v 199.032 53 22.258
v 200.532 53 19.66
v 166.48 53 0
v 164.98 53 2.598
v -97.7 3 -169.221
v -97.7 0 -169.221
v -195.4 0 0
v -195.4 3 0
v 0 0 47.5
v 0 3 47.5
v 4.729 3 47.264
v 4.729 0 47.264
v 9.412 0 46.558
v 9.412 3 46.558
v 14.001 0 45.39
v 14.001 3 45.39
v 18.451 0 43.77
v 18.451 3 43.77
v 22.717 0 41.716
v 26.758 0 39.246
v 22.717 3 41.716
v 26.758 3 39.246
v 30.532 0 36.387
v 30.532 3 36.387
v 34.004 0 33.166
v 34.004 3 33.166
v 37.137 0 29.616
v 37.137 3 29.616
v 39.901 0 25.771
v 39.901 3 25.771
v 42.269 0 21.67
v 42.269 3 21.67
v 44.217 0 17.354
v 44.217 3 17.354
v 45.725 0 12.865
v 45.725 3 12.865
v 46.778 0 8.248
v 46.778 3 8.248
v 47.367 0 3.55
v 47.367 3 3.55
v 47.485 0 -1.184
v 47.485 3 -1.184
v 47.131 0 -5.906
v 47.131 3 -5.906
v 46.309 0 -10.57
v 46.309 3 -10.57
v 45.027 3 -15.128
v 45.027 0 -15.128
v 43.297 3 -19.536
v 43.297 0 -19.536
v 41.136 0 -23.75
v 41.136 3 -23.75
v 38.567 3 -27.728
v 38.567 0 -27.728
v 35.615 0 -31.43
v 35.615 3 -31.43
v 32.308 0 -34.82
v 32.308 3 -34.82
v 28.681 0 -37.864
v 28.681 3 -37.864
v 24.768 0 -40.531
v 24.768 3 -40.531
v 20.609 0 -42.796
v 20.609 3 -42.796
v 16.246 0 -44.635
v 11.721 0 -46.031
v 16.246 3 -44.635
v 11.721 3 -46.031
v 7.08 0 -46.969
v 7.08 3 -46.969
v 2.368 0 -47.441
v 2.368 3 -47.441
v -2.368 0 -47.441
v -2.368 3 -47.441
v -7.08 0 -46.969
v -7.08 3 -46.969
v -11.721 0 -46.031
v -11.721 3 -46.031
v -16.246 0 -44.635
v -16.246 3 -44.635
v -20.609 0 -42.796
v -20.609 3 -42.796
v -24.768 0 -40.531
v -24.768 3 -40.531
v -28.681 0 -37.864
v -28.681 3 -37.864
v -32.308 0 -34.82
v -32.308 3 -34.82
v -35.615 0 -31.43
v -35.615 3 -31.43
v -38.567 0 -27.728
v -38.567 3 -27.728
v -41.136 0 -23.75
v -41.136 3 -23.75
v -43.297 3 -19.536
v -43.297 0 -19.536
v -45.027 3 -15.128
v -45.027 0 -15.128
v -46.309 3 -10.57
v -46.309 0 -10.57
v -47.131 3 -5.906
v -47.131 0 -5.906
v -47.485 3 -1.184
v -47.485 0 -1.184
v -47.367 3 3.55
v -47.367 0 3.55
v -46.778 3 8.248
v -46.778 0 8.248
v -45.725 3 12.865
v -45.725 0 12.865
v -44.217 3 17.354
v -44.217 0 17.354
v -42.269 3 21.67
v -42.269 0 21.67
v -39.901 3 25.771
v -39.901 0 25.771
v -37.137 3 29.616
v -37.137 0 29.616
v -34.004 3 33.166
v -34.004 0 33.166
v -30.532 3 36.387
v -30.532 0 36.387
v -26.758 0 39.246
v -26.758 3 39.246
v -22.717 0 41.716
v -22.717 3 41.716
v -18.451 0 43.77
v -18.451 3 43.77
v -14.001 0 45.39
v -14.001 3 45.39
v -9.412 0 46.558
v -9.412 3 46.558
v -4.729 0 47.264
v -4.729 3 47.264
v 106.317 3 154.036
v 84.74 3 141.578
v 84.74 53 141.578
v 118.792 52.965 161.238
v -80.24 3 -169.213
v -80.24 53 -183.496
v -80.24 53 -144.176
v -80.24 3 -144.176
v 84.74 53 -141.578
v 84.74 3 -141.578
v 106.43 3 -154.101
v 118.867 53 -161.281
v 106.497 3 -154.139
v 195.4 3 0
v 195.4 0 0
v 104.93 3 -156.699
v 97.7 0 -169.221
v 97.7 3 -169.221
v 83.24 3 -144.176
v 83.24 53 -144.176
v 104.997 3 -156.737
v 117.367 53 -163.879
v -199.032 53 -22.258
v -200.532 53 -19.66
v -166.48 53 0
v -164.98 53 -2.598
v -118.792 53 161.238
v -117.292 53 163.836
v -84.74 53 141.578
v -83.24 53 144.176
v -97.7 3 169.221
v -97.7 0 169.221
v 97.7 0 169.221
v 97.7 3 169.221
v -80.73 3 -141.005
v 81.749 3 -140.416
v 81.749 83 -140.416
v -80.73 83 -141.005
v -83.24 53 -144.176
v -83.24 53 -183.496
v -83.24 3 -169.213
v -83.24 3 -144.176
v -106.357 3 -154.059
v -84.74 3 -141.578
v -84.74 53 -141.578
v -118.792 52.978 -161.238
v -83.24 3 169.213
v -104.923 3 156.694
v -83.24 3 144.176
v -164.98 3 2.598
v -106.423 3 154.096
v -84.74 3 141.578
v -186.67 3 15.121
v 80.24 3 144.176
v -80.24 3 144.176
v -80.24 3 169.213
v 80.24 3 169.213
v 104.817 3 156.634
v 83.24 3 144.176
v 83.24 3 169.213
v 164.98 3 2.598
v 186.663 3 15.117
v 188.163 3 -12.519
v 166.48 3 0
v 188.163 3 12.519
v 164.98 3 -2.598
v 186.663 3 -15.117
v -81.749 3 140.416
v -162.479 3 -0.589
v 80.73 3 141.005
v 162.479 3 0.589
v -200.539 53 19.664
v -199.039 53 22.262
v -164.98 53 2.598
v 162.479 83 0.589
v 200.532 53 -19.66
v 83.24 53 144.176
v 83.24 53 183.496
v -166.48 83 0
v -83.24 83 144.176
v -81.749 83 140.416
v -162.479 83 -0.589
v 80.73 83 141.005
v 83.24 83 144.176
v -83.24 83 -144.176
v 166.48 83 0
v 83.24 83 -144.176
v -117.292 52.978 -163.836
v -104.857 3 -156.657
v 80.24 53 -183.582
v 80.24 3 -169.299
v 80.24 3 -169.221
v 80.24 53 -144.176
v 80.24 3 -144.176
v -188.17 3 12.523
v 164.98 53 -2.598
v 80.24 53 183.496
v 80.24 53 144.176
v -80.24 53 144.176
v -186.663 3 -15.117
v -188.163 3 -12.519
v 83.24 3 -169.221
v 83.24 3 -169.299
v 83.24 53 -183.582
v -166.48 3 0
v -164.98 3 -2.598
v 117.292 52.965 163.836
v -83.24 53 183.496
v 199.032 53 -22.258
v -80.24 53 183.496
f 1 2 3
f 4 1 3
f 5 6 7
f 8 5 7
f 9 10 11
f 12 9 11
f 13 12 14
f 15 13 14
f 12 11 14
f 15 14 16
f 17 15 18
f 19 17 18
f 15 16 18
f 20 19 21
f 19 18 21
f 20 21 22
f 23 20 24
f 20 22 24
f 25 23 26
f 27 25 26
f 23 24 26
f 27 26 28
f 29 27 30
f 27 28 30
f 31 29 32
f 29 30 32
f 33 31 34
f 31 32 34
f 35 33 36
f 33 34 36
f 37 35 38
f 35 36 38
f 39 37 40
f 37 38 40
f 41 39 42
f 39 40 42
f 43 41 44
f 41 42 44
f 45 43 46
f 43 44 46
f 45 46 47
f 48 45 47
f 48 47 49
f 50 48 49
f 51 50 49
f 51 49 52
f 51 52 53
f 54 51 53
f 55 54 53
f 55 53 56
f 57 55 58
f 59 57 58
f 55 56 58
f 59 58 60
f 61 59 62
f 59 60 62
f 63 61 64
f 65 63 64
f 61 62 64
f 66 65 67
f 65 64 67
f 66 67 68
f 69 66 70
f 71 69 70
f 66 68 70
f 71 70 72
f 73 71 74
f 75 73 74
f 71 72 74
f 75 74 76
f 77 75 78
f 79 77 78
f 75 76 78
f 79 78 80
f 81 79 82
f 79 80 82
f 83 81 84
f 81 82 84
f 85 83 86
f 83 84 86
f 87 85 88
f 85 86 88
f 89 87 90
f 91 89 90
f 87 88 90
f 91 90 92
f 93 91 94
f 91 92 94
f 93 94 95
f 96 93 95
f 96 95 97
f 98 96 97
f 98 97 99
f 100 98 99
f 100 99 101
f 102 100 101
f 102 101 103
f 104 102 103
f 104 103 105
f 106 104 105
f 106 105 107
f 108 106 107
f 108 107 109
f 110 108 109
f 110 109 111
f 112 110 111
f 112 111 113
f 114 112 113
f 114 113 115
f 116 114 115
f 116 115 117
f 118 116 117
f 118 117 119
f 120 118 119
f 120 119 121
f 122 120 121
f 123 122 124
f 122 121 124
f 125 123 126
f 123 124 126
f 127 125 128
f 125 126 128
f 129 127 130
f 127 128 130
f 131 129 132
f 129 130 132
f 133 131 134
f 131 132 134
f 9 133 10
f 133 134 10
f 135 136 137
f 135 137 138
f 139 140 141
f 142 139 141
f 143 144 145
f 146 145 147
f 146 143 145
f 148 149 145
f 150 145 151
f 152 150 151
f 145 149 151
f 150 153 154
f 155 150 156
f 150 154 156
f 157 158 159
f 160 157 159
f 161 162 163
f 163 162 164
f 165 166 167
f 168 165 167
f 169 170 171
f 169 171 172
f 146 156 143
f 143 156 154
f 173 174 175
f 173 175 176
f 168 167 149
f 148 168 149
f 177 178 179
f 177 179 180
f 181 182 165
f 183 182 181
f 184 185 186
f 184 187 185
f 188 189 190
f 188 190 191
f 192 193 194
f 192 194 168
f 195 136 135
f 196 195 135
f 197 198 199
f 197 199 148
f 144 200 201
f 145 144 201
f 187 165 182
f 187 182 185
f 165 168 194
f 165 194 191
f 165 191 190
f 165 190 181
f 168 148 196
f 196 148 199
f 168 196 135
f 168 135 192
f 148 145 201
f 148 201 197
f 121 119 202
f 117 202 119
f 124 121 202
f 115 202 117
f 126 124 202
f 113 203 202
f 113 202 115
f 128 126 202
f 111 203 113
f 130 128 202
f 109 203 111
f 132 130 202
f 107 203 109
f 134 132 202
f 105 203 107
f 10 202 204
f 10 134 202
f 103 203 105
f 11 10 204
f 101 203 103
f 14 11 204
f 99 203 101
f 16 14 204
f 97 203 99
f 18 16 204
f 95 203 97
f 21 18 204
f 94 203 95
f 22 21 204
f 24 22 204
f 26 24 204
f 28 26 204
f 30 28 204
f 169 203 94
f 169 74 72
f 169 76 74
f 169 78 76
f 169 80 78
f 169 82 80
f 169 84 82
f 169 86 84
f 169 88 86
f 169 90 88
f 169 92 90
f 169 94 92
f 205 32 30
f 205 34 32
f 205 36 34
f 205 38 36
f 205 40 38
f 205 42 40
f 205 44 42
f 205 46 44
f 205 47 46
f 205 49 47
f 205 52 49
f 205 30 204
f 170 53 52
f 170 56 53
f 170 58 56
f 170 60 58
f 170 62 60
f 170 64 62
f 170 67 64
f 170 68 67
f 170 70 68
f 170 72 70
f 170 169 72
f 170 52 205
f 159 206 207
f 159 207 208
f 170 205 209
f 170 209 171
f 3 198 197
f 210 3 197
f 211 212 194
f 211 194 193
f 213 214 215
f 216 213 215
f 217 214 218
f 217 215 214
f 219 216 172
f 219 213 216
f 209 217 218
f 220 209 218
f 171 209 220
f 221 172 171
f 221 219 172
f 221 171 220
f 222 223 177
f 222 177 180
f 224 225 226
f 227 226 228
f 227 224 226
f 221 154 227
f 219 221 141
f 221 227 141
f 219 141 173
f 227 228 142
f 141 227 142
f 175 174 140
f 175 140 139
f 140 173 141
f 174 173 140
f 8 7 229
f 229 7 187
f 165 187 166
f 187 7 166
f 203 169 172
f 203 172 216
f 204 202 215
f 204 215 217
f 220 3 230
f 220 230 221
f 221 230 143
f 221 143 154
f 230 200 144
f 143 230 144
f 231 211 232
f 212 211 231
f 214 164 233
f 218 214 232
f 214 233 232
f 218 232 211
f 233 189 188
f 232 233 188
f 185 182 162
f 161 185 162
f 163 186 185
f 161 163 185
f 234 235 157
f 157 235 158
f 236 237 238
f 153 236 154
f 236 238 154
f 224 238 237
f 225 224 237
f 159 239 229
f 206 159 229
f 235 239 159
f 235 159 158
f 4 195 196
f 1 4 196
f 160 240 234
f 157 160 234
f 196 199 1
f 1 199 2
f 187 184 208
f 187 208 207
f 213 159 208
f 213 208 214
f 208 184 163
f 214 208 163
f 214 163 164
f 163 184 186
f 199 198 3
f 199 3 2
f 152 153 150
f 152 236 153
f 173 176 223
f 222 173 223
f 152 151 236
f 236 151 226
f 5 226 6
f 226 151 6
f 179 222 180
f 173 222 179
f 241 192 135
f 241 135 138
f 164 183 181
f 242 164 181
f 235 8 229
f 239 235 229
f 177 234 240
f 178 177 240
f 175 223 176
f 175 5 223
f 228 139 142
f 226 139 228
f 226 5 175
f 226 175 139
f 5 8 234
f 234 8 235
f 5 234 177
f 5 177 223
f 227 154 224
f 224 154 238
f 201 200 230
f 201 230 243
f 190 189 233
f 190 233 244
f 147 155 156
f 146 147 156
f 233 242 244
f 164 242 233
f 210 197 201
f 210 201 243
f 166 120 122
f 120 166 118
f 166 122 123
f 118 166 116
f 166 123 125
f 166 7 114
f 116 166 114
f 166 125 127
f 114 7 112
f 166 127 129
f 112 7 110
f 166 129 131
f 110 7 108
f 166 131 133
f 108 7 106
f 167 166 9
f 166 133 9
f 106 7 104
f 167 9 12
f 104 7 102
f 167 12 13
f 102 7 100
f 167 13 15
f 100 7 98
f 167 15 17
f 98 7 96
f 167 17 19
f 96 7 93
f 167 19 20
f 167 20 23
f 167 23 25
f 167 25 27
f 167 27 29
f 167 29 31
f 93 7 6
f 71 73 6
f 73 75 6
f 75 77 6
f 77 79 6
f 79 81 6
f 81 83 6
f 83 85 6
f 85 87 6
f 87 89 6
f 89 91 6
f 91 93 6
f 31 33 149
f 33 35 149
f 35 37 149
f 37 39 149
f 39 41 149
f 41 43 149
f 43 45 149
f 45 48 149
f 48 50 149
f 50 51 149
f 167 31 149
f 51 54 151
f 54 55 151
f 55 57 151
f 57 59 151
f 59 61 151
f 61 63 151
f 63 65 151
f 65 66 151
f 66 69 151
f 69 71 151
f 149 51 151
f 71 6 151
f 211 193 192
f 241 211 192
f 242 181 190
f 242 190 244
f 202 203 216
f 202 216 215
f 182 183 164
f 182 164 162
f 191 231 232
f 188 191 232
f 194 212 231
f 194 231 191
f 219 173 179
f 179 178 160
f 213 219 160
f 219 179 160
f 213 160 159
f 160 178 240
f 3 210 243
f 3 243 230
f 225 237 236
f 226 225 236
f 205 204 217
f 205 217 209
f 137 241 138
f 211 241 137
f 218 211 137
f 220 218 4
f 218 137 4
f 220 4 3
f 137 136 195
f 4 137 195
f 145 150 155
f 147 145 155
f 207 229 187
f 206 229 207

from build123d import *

# Parameters (mm, degrees)
EXTRUDE_2_DEPTH     = 3
SKETCH_4_R          = 47.5
CUT_EXTRUDE_1_DEPTH = 3
EXTRUDE_3_DEPTH     = 80
EXTRUDE_7_DEPTH     = 3
EXTRUDE_11_DEPTH    = 3
EXTRUDE_12_DEPTH    = 3
EXTRUDE_13_DEPTH    = 3
EXTRUDE_14_DEPTH    = 3
EXTRUDE_15_DEPTH    = 3
EXTRUDE_16_DEPTH    = 3
EXTRUDE_17_DEPTH    = 3
EXTRUDE_18_DEPTH    = 3
EXTRUDE_19_DEPTH    = 3
EXTRUDE_20_DEPTH    = 3
EXTRUDE_21_DEPTH    = 3


with BuildPart() as part:
    # 草图3 → 凸台-拉伸2 (new body)
    with BuildSketch(Plane(origin=(0, 0, 0), x_dir=(1, 0, 0), z_dir=(0, 1, 0))):
        Polygon((195.4, 0), (97.7, 169.221363899), (-97.7, 169.221363899), (-195.4, 0), (-97.7, -169.221363899), (97.7, -169.221363899), align=None)
    extrude(amount=EXTRUDE_2_DEPTH)

    # 草图4 → 切除-拉伸1 (cut)
    with BuildSketch(Plane(origin=(0, 3, 0), x_dir=(1, 0, 0), z_dir=(0, 1, 0))):
        with Locations(Location((0, 0, 0), (0, 0, 270))):
            Circle(SKETCH_4_R)
    extrude(amount=-CUT_EXTRUDE_1_DEPTH, mode=Mode.SUBTRACT)

    # 草图5 → 凸台-拉伸3 (add)
    with BuildSketch(Plane(origin=(0, 3, 0), x_dir=(1, 0, 0), z_dir=(0, 1, 0))):
        Polygon((83.24, 144.175909222), (-83.24, 144.175909222), (-166.48, 0), (-83.24, -144.175909222), (83.24, -144.175909222), (166.48, 0), align=None)
        Polygon((-80.729537332, 141.005291398), (-162.478933084, 0.588815534), (-81.749395753, -140.416475864), (80.729537332, -141.005291398), (162.478933084, -0.588815534), (81.749395753, 140.416475864), align=None, mode=Mode.SUBTRACT)
    extrude(amount=EXTRUDE_3_DEPTH)

    # 草图11 → 凸台-拉伸7 (add)
    with BuildSketch(Plane(origin=(83.24, 0, 0), x_dir=(0, 0, -1), z_dir=(1, 0, 0))):
        Polygon((144.175909222, 3), (144.175909222, 53), (183.582235223, 53), (169.299378366, 3), align=None)
    extrude(amount=-EXTRUDE_7_DEPTH)

    # 草图15 → 凸台-拉伸11 (add)
    with BuildSketch(Plane(origin=(-41.62, 0, -72.087954611), x_dir=(-0.8660254037844382, 0, 0.500000000000001), z_dir=(-0.500000000000001, 0, -0.8660254037844382))):
        Polygon((-144.175909222, 53), (-144.175909222, 3), (-169.299052365, 3), (-183.581909222, 53), align=None)
    extrude(amount=-EXTRUDE_11_DEPTH)

    # 草图17 → 凸台-拉伸12 (add)
    with BuildSketch(Plane(origin=(-41.62, 0, -72.087954611), x_dir=(-0.8660254037844382, 0, 0.500000000000001), z_dir=(-0.500000000000001, 0, -0.8660254037844382))):
        Polygon((144.175909222, 3), (169.221363899, 3), (183.504220757, 53), (144.175909222, 53), align=None)
    extrude(amount=-EXTRUDE_12_DEPTH)

    # 草图19 → 凸台-拉伸13 (add)
    with BuildSketch(Plane(origin=(83.24, 0, 0), x_dir=(0, 0, -1), z_dir=(1, 0, 0))):
        Polygon((-144.175909222, 3), (-144.175909222, 53), (-183.495909222, 53), (-169.213052365, 3), align=None)
    extrude(amount=-EXTRUDE_13_DEPTH)

    # 草图20 → 凸台-拉伸14 (add)
    with BuildSketch(Plane(origin=(-83.24, 0, 0), x_dir=(0, 0, -1), z_dir=(1, 0, 0))):
        Polygon((144.175909222, 3), (144.175909222, 53), (183.495909222, 53), (169.213052365, 3), align=None)
    extrude(amount=EXTRUDE_14_DEPTH)

    # 草图22 → 凸台-拉伸15 (add)
    with BuildSketch(Plane(origin=(-83.24, 0, 0), x_dir=(0, 0, -1), z_dir=(1, 0, 0))):
        Polygon((-144.175909222, 53), (-144.175909222, 3), (-169.213052365, 3), (-183.495909222, 53), align=None)
    extrude(amount=EXTRUDE_15_DEPTH)

    # 草图23 → 凸台-拉伸16 (add)
    with BuildSketch(Plane(origin=(-41.62, 0, 72.087954611), x_dir=(-0.8660254037844406, 0, -0.4999999999999966), z_dir=(0.4999999999999966, 0, -0.8660254037844406))):
        Polygon((-144.175909222, 53), (-144.175909222, 3), (-169.091328291, 3), (-183.495909222, 52.96506828), align=None)
    extrude(amount=EXTRUDE_16_DEPTH)

    # 草图24 → 凸台-拉伸17 (add)
    with BuildSketch(Plane(origin=(41.62, 0, -72.087954611), x_dir=(-0.866025403784439, 0, -0.4999999999999994), z_dir=(0.4999999999999994, 0, -0.866025403784439))):
        Polygon((-144.175909222, 3), (-169.213052365, 3), (-183.495909222, 53), (-144.175909222, 53), align=None)
    extrude(amount=-EXTRUDE_17_DEPTH)

    # 草图26 → 凸台-拉伸18 (add)
    with BuildSketch(Plane(origin=(-41.62, 0, 72.087954611), x_dir=(-0.8660254037844406, 0, -0.4999999999999966), z_dir=(0.4999999999999966, 0, -0.8660254037844406))):
        Polygon((144.175909222, 53), (144.175909222, 3), (169.213052365, 3), (183.495909222, 53), align=None)
    extrude(amount=EXTRUDE_18_DEPTH)

    # 草图27 → 凸台-拉伸19 (add)
    with BuildSketch(Plane(origin=(41.62, 0, -72.087954611), x_dir=(-0.866025403784439, 0, -0.4999999999999994), z_dir=(0.4999999999999994, 0, -0.866025403784439))):
        Polygon((144.175909222, 53), (144.175909222, 3), (169.137463214, 3), (183.495909222, 52.978345593), align=None)
    extrude(amount=-EXTRUDE_19_DEPTH)

    # 草图28 → 凸台-拉伸20 (add)
    with BuildSketch(Plane(origin=(41.62, 0, 72.087954611), x_dir=(-0.8660254037844407, 0, 0.4999999999999965), z_dir=(-0.4999999999999965, -1.145624345781526e-15, -0.8660254037844407))):
        Polygon((144.175909222, 53), (144.175909222, 3), (169.213052365, 3), (183.495909222, 53), align=None)
    extrude(amount=EXTRUDE_20_DEPTH)

    # 草图31 → 凸台-拉伸21 (add)
    with BuildSketch(Plane(origin=(41.62, 0, 72.087954611), x_dir=(-0.8660254037844407, 0, 0.4999999999999965), z_dir=(-0.4999999999999965, -1.145624345781526e-15, -0.8660254037844407))):
        Polygon((-144.175909222, 53), (-144.175909222, 3), (-169.213052365, 3), (-183.495909222, 53), align=None)
    extrude(amount=EXTRUDE_21_DEPTH)


solid = part.part
